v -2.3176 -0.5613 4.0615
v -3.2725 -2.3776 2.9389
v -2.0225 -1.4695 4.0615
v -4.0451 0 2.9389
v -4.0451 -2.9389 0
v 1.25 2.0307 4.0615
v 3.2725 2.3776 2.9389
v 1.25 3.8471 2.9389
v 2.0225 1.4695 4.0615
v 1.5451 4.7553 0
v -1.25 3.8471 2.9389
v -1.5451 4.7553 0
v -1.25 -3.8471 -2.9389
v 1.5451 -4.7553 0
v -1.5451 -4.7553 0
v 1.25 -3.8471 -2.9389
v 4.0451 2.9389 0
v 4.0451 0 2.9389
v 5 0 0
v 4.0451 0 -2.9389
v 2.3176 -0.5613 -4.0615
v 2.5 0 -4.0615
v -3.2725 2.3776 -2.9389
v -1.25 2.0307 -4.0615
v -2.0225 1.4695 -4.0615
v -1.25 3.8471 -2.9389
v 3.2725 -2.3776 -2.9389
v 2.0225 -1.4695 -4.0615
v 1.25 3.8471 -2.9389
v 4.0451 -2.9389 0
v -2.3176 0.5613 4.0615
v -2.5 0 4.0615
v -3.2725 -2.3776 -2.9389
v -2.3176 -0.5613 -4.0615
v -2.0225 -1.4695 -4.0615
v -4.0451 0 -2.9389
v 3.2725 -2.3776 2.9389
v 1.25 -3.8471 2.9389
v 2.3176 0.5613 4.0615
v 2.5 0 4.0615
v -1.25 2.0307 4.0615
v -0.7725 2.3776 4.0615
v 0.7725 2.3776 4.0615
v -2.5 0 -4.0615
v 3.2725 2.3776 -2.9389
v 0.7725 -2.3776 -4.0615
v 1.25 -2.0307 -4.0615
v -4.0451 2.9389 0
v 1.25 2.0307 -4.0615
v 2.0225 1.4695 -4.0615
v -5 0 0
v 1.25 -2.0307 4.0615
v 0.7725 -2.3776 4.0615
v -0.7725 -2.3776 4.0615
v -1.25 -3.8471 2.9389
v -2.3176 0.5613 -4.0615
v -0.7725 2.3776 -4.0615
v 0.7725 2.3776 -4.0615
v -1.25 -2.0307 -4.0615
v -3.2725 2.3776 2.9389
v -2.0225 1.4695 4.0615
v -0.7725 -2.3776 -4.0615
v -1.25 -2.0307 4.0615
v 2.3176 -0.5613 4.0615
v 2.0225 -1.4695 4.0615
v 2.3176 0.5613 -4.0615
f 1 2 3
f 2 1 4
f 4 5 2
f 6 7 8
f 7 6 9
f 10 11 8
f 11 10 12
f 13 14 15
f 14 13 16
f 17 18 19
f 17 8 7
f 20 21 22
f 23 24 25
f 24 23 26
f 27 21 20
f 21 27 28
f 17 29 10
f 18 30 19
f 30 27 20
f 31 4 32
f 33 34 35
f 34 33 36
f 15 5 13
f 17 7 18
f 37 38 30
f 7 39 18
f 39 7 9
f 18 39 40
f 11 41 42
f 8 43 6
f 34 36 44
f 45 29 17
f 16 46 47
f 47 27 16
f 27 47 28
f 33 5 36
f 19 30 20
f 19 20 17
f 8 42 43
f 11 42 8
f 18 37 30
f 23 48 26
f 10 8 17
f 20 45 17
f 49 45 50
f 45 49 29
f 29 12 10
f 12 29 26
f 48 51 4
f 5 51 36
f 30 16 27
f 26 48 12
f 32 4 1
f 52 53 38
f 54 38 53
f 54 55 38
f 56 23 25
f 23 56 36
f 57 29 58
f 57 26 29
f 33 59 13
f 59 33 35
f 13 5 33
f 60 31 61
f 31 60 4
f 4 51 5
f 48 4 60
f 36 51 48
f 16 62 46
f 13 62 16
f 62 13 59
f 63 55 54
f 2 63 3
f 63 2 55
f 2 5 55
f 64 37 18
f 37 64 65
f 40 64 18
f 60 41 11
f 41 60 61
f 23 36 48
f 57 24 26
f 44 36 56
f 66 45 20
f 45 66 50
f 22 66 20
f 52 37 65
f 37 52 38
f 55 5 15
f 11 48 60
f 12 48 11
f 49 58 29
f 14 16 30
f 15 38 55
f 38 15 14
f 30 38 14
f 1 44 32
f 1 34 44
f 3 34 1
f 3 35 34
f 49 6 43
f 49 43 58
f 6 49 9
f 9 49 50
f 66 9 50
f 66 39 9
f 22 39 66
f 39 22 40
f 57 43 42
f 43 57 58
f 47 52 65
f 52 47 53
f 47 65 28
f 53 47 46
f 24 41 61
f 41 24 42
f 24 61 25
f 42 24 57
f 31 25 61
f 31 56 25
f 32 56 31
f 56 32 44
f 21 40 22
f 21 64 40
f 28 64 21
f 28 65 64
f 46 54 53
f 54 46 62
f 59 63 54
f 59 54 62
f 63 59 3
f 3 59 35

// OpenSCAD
module shape(v1=10, v2=5){
    difference(){
        sphere(d=v1, $fn=10);
        cylinder(d=v2, $fn=10, h=v1+1, center=true);
    }
}

shape();
